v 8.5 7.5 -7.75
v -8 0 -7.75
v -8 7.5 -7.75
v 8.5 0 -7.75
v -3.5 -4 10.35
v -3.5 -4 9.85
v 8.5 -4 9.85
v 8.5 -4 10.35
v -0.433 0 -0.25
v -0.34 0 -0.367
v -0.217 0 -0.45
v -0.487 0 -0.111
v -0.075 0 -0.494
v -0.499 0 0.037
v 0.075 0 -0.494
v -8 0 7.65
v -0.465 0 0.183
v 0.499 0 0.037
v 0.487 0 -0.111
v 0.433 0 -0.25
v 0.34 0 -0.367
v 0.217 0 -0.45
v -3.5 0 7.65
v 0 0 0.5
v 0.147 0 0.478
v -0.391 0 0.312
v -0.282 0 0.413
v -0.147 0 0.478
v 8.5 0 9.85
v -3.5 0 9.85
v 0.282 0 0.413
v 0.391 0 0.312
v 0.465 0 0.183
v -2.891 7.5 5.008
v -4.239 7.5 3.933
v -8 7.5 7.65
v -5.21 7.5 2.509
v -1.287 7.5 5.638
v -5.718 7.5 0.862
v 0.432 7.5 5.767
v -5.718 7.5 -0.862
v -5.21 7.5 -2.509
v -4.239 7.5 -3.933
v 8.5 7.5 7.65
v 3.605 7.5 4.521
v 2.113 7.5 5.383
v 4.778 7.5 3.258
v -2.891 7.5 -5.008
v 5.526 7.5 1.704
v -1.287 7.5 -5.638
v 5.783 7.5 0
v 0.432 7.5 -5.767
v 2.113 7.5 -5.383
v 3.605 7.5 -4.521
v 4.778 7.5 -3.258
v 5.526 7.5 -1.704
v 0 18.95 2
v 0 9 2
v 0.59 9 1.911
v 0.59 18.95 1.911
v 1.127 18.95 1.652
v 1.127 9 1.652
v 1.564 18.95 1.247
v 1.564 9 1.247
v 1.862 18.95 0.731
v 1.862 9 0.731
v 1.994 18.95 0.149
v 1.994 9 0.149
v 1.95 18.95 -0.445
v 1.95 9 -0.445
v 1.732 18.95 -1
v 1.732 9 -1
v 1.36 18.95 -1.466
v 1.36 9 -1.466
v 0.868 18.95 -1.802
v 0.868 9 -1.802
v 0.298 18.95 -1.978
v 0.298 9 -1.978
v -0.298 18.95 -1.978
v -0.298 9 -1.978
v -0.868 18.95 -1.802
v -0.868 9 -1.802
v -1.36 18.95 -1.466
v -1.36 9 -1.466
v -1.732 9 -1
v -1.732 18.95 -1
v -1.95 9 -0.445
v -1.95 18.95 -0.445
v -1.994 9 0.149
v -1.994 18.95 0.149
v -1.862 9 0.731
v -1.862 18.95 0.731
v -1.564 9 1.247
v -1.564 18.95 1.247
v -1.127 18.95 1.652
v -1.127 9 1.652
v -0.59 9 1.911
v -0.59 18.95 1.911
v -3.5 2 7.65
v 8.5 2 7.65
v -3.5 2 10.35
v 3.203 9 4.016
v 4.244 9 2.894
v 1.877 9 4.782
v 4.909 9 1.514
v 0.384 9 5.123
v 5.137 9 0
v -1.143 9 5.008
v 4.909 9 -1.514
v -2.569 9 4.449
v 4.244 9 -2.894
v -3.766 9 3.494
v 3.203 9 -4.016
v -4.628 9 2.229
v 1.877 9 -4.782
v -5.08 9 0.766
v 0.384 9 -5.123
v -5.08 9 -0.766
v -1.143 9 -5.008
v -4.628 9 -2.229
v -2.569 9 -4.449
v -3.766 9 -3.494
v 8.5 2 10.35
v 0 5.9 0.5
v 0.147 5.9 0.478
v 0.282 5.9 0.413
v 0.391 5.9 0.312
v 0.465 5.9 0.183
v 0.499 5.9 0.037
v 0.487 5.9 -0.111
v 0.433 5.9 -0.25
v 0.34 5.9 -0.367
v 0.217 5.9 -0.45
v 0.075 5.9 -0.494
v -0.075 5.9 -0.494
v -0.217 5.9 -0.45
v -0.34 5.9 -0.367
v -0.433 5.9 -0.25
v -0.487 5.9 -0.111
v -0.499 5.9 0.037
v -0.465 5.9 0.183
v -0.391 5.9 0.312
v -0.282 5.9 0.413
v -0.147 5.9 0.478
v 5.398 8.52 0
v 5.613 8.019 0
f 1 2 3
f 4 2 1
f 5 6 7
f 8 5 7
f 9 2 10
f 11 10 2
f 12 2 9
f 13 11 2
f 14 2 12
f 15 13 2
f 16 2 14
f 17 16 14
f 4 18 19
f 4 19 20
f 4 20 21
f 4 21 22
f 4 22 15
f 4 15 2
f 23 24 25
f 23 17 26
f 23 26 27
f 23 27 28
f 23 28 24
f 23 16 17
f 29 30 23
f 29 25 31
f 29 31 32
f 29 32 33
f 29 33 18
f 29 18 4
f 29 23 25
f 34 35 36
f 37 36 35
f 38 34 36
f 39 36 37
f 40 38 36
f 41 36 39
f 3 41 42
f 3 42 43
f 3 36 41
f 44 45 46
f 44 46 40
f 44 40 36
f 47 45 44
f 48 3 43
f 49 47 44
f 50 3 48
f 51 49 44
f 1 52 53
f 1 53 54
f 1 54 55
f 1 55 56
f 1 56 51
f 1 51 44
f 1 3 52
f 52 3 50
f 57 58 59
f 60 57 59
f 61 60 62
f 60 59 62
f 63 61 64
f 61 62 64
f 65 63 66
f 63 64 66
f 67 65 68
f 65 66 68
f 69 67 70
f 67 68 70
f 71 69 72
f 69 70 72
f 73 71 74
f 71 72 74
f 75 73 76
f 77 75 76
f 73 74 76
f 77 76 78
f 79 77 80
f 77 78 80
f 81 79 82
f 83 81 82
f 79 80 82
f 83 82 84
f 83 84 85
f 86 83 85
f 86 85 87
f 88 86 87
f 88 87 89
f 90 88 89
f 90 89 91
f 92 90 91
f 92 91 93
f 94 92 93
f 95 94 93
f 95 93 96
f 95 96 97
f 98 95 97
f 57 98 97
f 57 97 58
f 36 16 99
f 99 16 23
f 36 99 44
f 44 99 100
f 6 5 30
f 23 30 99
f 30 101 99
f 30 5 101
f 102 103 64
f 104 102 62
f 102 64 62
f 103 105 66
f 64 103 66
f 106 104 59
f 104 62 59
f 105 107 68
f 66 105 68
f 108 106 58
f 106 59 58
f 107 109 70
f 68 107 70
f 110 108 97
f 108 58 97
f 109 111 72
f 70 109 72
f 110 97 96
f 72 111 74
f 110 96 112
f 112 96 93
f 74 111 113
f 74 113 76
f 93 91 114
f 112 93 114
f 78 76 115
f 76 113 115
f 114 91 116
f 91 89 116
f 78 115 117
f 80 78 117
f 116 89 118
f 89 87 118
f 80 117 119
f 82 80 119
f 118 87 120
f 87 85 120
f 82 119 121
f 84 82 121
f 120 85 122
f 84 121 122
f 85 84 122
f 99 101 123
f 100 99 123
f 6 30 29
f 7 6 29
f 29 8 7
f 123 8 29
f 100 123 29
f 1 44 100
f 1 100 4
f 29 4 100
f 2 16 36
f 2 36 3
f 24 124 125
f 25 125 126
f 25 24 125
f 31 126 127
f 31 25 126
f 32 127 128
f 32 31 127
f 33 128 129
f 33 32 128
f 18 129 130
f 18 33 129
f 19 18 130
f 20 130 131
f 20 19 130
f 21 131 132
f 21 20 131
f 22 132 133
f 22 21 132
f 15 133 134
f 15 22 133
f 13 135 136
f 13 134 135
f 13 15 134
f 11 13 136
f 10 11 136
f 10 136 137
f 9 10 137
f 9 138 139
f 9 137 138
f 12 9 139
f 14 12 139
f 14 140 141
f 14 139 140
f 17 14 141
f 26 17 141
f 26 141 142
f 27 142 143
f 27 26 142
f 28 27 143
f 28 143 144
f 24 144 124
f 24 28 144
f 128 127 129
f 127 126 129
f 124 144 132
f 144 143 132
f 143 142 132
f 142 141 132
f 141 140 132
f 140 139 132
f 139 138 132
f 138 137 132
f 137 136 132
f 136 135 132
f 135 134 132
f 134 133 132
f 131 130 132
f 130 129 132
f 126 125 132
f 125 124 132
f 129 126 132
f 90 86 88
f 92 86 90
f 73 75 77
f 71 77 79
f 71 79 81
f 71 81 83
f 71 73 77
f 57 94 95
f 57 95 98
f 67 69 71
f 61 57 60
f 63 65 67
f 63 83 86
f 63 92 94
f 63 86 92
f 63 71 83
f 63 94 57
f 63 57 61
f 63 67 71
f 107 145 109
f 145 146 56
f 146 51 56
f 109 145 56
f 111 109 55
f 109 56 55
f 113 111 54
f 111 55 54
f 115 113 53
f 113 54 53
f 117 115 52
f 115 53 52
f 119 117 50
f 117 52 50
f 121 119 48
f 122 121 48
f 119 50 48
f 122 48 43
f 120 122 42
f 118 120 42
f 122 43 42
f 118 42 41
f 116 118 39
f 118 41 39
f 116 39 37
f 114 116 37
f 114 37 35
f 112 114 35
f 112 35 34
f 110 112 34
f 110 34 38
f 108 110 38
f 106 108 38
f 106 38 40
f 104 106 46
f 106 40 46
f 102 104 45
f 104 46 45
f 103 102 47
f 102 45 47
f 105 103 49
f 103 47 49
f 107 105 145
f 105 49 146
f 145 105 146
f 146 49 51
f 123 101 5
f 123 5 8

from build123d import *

# Parameters (mm, degrees)
SKETCH_1_W      = 16.5
SKETCH_1_H      = 15.4
SKETCH_1_R      = 0.5
EXTRUDE_1_DEPTH = 7.5
SKETCH_2_W      = 12
SKETCH_2_H      = 2.7
EXTRUDE_2_DEPTH = 2
SKETCH_3_W      = 12
SKETCH_3_H      = 0.5
EXTRUDE_3_DEPTH = 6
SKETCH_4_R      = 2
EXTRUDE_4_DEPTH = 11.45


with BuildPart() as part:
    # 草图1 → 凸台-拉伸1 (new body)
    with BuildSketch(Plane(origin=(0, 0, 0), x_dir=(1, 0, 0), z_dir=(0, 1, 0))):
        with Locations((0.25, 0.05)):
            Rectangle(SKETCH_1_W, SKETCH_1_H)
        with Locations(Location((0, 0, 0), (0, 0, 270))):
            Circle(SKETCH_1_R, mode=Mode.SUBTRACT)
    extrude(amount=EXTRUDE_1_DEPTH)

    # 草图2 → 凸台-拉伸2 (add)
    with BuildSketch(Plane.XZ):
        with Locations((2.5, 9)):
            Rectangle(SKETCH_2_W, SKETCH_2_H)
    extrude(amount=-EXTRUDE_2_DEPTH)

    # 草图3 → 凸台-拉伸3 (add)
    with BuildSketch(Plane(origin=(0, 2, 0), x_dir=(1, 0, 0), z_dir=(0, 1, 0))):
        with Locations((2.5, -10.1)):
            Rectangle(SKETCH_3_W, SKETCH_3_H)
    extrude(amount=-EXTRUDE_3_DEPTH)

    # 草图4 → 凸台-拉伸4 (add)
    with BuildSketch(Plane(origin=(0, 7.5, 0), x_dir=(1, 0, 0), z_dir=(0, 1, 0))):
        with Locations(Location((0, 0, 0), (0, 0, 270))):
            Circle(SKETCH_4_R)
    extrude(amount=EXTRUDE_4_DEPTH)

    # 草图5 → 旋转1 (revolve)
    with BuildSketch(Plane.XY):
        with BuildLine():
            Line((0, 9), (5.137119816, 9))
            ThreePointArc((5.137119816, 9), (5.780256002, 7.508925279), (6, 5.9))
            Line((6, 5.9), (0, 5.9))
            Line((0, 5.9), (0, 9))
        make_face()
    revolve(axis=Axis((0, 0, 0), (0, 1, 0)))


solid = part.part
